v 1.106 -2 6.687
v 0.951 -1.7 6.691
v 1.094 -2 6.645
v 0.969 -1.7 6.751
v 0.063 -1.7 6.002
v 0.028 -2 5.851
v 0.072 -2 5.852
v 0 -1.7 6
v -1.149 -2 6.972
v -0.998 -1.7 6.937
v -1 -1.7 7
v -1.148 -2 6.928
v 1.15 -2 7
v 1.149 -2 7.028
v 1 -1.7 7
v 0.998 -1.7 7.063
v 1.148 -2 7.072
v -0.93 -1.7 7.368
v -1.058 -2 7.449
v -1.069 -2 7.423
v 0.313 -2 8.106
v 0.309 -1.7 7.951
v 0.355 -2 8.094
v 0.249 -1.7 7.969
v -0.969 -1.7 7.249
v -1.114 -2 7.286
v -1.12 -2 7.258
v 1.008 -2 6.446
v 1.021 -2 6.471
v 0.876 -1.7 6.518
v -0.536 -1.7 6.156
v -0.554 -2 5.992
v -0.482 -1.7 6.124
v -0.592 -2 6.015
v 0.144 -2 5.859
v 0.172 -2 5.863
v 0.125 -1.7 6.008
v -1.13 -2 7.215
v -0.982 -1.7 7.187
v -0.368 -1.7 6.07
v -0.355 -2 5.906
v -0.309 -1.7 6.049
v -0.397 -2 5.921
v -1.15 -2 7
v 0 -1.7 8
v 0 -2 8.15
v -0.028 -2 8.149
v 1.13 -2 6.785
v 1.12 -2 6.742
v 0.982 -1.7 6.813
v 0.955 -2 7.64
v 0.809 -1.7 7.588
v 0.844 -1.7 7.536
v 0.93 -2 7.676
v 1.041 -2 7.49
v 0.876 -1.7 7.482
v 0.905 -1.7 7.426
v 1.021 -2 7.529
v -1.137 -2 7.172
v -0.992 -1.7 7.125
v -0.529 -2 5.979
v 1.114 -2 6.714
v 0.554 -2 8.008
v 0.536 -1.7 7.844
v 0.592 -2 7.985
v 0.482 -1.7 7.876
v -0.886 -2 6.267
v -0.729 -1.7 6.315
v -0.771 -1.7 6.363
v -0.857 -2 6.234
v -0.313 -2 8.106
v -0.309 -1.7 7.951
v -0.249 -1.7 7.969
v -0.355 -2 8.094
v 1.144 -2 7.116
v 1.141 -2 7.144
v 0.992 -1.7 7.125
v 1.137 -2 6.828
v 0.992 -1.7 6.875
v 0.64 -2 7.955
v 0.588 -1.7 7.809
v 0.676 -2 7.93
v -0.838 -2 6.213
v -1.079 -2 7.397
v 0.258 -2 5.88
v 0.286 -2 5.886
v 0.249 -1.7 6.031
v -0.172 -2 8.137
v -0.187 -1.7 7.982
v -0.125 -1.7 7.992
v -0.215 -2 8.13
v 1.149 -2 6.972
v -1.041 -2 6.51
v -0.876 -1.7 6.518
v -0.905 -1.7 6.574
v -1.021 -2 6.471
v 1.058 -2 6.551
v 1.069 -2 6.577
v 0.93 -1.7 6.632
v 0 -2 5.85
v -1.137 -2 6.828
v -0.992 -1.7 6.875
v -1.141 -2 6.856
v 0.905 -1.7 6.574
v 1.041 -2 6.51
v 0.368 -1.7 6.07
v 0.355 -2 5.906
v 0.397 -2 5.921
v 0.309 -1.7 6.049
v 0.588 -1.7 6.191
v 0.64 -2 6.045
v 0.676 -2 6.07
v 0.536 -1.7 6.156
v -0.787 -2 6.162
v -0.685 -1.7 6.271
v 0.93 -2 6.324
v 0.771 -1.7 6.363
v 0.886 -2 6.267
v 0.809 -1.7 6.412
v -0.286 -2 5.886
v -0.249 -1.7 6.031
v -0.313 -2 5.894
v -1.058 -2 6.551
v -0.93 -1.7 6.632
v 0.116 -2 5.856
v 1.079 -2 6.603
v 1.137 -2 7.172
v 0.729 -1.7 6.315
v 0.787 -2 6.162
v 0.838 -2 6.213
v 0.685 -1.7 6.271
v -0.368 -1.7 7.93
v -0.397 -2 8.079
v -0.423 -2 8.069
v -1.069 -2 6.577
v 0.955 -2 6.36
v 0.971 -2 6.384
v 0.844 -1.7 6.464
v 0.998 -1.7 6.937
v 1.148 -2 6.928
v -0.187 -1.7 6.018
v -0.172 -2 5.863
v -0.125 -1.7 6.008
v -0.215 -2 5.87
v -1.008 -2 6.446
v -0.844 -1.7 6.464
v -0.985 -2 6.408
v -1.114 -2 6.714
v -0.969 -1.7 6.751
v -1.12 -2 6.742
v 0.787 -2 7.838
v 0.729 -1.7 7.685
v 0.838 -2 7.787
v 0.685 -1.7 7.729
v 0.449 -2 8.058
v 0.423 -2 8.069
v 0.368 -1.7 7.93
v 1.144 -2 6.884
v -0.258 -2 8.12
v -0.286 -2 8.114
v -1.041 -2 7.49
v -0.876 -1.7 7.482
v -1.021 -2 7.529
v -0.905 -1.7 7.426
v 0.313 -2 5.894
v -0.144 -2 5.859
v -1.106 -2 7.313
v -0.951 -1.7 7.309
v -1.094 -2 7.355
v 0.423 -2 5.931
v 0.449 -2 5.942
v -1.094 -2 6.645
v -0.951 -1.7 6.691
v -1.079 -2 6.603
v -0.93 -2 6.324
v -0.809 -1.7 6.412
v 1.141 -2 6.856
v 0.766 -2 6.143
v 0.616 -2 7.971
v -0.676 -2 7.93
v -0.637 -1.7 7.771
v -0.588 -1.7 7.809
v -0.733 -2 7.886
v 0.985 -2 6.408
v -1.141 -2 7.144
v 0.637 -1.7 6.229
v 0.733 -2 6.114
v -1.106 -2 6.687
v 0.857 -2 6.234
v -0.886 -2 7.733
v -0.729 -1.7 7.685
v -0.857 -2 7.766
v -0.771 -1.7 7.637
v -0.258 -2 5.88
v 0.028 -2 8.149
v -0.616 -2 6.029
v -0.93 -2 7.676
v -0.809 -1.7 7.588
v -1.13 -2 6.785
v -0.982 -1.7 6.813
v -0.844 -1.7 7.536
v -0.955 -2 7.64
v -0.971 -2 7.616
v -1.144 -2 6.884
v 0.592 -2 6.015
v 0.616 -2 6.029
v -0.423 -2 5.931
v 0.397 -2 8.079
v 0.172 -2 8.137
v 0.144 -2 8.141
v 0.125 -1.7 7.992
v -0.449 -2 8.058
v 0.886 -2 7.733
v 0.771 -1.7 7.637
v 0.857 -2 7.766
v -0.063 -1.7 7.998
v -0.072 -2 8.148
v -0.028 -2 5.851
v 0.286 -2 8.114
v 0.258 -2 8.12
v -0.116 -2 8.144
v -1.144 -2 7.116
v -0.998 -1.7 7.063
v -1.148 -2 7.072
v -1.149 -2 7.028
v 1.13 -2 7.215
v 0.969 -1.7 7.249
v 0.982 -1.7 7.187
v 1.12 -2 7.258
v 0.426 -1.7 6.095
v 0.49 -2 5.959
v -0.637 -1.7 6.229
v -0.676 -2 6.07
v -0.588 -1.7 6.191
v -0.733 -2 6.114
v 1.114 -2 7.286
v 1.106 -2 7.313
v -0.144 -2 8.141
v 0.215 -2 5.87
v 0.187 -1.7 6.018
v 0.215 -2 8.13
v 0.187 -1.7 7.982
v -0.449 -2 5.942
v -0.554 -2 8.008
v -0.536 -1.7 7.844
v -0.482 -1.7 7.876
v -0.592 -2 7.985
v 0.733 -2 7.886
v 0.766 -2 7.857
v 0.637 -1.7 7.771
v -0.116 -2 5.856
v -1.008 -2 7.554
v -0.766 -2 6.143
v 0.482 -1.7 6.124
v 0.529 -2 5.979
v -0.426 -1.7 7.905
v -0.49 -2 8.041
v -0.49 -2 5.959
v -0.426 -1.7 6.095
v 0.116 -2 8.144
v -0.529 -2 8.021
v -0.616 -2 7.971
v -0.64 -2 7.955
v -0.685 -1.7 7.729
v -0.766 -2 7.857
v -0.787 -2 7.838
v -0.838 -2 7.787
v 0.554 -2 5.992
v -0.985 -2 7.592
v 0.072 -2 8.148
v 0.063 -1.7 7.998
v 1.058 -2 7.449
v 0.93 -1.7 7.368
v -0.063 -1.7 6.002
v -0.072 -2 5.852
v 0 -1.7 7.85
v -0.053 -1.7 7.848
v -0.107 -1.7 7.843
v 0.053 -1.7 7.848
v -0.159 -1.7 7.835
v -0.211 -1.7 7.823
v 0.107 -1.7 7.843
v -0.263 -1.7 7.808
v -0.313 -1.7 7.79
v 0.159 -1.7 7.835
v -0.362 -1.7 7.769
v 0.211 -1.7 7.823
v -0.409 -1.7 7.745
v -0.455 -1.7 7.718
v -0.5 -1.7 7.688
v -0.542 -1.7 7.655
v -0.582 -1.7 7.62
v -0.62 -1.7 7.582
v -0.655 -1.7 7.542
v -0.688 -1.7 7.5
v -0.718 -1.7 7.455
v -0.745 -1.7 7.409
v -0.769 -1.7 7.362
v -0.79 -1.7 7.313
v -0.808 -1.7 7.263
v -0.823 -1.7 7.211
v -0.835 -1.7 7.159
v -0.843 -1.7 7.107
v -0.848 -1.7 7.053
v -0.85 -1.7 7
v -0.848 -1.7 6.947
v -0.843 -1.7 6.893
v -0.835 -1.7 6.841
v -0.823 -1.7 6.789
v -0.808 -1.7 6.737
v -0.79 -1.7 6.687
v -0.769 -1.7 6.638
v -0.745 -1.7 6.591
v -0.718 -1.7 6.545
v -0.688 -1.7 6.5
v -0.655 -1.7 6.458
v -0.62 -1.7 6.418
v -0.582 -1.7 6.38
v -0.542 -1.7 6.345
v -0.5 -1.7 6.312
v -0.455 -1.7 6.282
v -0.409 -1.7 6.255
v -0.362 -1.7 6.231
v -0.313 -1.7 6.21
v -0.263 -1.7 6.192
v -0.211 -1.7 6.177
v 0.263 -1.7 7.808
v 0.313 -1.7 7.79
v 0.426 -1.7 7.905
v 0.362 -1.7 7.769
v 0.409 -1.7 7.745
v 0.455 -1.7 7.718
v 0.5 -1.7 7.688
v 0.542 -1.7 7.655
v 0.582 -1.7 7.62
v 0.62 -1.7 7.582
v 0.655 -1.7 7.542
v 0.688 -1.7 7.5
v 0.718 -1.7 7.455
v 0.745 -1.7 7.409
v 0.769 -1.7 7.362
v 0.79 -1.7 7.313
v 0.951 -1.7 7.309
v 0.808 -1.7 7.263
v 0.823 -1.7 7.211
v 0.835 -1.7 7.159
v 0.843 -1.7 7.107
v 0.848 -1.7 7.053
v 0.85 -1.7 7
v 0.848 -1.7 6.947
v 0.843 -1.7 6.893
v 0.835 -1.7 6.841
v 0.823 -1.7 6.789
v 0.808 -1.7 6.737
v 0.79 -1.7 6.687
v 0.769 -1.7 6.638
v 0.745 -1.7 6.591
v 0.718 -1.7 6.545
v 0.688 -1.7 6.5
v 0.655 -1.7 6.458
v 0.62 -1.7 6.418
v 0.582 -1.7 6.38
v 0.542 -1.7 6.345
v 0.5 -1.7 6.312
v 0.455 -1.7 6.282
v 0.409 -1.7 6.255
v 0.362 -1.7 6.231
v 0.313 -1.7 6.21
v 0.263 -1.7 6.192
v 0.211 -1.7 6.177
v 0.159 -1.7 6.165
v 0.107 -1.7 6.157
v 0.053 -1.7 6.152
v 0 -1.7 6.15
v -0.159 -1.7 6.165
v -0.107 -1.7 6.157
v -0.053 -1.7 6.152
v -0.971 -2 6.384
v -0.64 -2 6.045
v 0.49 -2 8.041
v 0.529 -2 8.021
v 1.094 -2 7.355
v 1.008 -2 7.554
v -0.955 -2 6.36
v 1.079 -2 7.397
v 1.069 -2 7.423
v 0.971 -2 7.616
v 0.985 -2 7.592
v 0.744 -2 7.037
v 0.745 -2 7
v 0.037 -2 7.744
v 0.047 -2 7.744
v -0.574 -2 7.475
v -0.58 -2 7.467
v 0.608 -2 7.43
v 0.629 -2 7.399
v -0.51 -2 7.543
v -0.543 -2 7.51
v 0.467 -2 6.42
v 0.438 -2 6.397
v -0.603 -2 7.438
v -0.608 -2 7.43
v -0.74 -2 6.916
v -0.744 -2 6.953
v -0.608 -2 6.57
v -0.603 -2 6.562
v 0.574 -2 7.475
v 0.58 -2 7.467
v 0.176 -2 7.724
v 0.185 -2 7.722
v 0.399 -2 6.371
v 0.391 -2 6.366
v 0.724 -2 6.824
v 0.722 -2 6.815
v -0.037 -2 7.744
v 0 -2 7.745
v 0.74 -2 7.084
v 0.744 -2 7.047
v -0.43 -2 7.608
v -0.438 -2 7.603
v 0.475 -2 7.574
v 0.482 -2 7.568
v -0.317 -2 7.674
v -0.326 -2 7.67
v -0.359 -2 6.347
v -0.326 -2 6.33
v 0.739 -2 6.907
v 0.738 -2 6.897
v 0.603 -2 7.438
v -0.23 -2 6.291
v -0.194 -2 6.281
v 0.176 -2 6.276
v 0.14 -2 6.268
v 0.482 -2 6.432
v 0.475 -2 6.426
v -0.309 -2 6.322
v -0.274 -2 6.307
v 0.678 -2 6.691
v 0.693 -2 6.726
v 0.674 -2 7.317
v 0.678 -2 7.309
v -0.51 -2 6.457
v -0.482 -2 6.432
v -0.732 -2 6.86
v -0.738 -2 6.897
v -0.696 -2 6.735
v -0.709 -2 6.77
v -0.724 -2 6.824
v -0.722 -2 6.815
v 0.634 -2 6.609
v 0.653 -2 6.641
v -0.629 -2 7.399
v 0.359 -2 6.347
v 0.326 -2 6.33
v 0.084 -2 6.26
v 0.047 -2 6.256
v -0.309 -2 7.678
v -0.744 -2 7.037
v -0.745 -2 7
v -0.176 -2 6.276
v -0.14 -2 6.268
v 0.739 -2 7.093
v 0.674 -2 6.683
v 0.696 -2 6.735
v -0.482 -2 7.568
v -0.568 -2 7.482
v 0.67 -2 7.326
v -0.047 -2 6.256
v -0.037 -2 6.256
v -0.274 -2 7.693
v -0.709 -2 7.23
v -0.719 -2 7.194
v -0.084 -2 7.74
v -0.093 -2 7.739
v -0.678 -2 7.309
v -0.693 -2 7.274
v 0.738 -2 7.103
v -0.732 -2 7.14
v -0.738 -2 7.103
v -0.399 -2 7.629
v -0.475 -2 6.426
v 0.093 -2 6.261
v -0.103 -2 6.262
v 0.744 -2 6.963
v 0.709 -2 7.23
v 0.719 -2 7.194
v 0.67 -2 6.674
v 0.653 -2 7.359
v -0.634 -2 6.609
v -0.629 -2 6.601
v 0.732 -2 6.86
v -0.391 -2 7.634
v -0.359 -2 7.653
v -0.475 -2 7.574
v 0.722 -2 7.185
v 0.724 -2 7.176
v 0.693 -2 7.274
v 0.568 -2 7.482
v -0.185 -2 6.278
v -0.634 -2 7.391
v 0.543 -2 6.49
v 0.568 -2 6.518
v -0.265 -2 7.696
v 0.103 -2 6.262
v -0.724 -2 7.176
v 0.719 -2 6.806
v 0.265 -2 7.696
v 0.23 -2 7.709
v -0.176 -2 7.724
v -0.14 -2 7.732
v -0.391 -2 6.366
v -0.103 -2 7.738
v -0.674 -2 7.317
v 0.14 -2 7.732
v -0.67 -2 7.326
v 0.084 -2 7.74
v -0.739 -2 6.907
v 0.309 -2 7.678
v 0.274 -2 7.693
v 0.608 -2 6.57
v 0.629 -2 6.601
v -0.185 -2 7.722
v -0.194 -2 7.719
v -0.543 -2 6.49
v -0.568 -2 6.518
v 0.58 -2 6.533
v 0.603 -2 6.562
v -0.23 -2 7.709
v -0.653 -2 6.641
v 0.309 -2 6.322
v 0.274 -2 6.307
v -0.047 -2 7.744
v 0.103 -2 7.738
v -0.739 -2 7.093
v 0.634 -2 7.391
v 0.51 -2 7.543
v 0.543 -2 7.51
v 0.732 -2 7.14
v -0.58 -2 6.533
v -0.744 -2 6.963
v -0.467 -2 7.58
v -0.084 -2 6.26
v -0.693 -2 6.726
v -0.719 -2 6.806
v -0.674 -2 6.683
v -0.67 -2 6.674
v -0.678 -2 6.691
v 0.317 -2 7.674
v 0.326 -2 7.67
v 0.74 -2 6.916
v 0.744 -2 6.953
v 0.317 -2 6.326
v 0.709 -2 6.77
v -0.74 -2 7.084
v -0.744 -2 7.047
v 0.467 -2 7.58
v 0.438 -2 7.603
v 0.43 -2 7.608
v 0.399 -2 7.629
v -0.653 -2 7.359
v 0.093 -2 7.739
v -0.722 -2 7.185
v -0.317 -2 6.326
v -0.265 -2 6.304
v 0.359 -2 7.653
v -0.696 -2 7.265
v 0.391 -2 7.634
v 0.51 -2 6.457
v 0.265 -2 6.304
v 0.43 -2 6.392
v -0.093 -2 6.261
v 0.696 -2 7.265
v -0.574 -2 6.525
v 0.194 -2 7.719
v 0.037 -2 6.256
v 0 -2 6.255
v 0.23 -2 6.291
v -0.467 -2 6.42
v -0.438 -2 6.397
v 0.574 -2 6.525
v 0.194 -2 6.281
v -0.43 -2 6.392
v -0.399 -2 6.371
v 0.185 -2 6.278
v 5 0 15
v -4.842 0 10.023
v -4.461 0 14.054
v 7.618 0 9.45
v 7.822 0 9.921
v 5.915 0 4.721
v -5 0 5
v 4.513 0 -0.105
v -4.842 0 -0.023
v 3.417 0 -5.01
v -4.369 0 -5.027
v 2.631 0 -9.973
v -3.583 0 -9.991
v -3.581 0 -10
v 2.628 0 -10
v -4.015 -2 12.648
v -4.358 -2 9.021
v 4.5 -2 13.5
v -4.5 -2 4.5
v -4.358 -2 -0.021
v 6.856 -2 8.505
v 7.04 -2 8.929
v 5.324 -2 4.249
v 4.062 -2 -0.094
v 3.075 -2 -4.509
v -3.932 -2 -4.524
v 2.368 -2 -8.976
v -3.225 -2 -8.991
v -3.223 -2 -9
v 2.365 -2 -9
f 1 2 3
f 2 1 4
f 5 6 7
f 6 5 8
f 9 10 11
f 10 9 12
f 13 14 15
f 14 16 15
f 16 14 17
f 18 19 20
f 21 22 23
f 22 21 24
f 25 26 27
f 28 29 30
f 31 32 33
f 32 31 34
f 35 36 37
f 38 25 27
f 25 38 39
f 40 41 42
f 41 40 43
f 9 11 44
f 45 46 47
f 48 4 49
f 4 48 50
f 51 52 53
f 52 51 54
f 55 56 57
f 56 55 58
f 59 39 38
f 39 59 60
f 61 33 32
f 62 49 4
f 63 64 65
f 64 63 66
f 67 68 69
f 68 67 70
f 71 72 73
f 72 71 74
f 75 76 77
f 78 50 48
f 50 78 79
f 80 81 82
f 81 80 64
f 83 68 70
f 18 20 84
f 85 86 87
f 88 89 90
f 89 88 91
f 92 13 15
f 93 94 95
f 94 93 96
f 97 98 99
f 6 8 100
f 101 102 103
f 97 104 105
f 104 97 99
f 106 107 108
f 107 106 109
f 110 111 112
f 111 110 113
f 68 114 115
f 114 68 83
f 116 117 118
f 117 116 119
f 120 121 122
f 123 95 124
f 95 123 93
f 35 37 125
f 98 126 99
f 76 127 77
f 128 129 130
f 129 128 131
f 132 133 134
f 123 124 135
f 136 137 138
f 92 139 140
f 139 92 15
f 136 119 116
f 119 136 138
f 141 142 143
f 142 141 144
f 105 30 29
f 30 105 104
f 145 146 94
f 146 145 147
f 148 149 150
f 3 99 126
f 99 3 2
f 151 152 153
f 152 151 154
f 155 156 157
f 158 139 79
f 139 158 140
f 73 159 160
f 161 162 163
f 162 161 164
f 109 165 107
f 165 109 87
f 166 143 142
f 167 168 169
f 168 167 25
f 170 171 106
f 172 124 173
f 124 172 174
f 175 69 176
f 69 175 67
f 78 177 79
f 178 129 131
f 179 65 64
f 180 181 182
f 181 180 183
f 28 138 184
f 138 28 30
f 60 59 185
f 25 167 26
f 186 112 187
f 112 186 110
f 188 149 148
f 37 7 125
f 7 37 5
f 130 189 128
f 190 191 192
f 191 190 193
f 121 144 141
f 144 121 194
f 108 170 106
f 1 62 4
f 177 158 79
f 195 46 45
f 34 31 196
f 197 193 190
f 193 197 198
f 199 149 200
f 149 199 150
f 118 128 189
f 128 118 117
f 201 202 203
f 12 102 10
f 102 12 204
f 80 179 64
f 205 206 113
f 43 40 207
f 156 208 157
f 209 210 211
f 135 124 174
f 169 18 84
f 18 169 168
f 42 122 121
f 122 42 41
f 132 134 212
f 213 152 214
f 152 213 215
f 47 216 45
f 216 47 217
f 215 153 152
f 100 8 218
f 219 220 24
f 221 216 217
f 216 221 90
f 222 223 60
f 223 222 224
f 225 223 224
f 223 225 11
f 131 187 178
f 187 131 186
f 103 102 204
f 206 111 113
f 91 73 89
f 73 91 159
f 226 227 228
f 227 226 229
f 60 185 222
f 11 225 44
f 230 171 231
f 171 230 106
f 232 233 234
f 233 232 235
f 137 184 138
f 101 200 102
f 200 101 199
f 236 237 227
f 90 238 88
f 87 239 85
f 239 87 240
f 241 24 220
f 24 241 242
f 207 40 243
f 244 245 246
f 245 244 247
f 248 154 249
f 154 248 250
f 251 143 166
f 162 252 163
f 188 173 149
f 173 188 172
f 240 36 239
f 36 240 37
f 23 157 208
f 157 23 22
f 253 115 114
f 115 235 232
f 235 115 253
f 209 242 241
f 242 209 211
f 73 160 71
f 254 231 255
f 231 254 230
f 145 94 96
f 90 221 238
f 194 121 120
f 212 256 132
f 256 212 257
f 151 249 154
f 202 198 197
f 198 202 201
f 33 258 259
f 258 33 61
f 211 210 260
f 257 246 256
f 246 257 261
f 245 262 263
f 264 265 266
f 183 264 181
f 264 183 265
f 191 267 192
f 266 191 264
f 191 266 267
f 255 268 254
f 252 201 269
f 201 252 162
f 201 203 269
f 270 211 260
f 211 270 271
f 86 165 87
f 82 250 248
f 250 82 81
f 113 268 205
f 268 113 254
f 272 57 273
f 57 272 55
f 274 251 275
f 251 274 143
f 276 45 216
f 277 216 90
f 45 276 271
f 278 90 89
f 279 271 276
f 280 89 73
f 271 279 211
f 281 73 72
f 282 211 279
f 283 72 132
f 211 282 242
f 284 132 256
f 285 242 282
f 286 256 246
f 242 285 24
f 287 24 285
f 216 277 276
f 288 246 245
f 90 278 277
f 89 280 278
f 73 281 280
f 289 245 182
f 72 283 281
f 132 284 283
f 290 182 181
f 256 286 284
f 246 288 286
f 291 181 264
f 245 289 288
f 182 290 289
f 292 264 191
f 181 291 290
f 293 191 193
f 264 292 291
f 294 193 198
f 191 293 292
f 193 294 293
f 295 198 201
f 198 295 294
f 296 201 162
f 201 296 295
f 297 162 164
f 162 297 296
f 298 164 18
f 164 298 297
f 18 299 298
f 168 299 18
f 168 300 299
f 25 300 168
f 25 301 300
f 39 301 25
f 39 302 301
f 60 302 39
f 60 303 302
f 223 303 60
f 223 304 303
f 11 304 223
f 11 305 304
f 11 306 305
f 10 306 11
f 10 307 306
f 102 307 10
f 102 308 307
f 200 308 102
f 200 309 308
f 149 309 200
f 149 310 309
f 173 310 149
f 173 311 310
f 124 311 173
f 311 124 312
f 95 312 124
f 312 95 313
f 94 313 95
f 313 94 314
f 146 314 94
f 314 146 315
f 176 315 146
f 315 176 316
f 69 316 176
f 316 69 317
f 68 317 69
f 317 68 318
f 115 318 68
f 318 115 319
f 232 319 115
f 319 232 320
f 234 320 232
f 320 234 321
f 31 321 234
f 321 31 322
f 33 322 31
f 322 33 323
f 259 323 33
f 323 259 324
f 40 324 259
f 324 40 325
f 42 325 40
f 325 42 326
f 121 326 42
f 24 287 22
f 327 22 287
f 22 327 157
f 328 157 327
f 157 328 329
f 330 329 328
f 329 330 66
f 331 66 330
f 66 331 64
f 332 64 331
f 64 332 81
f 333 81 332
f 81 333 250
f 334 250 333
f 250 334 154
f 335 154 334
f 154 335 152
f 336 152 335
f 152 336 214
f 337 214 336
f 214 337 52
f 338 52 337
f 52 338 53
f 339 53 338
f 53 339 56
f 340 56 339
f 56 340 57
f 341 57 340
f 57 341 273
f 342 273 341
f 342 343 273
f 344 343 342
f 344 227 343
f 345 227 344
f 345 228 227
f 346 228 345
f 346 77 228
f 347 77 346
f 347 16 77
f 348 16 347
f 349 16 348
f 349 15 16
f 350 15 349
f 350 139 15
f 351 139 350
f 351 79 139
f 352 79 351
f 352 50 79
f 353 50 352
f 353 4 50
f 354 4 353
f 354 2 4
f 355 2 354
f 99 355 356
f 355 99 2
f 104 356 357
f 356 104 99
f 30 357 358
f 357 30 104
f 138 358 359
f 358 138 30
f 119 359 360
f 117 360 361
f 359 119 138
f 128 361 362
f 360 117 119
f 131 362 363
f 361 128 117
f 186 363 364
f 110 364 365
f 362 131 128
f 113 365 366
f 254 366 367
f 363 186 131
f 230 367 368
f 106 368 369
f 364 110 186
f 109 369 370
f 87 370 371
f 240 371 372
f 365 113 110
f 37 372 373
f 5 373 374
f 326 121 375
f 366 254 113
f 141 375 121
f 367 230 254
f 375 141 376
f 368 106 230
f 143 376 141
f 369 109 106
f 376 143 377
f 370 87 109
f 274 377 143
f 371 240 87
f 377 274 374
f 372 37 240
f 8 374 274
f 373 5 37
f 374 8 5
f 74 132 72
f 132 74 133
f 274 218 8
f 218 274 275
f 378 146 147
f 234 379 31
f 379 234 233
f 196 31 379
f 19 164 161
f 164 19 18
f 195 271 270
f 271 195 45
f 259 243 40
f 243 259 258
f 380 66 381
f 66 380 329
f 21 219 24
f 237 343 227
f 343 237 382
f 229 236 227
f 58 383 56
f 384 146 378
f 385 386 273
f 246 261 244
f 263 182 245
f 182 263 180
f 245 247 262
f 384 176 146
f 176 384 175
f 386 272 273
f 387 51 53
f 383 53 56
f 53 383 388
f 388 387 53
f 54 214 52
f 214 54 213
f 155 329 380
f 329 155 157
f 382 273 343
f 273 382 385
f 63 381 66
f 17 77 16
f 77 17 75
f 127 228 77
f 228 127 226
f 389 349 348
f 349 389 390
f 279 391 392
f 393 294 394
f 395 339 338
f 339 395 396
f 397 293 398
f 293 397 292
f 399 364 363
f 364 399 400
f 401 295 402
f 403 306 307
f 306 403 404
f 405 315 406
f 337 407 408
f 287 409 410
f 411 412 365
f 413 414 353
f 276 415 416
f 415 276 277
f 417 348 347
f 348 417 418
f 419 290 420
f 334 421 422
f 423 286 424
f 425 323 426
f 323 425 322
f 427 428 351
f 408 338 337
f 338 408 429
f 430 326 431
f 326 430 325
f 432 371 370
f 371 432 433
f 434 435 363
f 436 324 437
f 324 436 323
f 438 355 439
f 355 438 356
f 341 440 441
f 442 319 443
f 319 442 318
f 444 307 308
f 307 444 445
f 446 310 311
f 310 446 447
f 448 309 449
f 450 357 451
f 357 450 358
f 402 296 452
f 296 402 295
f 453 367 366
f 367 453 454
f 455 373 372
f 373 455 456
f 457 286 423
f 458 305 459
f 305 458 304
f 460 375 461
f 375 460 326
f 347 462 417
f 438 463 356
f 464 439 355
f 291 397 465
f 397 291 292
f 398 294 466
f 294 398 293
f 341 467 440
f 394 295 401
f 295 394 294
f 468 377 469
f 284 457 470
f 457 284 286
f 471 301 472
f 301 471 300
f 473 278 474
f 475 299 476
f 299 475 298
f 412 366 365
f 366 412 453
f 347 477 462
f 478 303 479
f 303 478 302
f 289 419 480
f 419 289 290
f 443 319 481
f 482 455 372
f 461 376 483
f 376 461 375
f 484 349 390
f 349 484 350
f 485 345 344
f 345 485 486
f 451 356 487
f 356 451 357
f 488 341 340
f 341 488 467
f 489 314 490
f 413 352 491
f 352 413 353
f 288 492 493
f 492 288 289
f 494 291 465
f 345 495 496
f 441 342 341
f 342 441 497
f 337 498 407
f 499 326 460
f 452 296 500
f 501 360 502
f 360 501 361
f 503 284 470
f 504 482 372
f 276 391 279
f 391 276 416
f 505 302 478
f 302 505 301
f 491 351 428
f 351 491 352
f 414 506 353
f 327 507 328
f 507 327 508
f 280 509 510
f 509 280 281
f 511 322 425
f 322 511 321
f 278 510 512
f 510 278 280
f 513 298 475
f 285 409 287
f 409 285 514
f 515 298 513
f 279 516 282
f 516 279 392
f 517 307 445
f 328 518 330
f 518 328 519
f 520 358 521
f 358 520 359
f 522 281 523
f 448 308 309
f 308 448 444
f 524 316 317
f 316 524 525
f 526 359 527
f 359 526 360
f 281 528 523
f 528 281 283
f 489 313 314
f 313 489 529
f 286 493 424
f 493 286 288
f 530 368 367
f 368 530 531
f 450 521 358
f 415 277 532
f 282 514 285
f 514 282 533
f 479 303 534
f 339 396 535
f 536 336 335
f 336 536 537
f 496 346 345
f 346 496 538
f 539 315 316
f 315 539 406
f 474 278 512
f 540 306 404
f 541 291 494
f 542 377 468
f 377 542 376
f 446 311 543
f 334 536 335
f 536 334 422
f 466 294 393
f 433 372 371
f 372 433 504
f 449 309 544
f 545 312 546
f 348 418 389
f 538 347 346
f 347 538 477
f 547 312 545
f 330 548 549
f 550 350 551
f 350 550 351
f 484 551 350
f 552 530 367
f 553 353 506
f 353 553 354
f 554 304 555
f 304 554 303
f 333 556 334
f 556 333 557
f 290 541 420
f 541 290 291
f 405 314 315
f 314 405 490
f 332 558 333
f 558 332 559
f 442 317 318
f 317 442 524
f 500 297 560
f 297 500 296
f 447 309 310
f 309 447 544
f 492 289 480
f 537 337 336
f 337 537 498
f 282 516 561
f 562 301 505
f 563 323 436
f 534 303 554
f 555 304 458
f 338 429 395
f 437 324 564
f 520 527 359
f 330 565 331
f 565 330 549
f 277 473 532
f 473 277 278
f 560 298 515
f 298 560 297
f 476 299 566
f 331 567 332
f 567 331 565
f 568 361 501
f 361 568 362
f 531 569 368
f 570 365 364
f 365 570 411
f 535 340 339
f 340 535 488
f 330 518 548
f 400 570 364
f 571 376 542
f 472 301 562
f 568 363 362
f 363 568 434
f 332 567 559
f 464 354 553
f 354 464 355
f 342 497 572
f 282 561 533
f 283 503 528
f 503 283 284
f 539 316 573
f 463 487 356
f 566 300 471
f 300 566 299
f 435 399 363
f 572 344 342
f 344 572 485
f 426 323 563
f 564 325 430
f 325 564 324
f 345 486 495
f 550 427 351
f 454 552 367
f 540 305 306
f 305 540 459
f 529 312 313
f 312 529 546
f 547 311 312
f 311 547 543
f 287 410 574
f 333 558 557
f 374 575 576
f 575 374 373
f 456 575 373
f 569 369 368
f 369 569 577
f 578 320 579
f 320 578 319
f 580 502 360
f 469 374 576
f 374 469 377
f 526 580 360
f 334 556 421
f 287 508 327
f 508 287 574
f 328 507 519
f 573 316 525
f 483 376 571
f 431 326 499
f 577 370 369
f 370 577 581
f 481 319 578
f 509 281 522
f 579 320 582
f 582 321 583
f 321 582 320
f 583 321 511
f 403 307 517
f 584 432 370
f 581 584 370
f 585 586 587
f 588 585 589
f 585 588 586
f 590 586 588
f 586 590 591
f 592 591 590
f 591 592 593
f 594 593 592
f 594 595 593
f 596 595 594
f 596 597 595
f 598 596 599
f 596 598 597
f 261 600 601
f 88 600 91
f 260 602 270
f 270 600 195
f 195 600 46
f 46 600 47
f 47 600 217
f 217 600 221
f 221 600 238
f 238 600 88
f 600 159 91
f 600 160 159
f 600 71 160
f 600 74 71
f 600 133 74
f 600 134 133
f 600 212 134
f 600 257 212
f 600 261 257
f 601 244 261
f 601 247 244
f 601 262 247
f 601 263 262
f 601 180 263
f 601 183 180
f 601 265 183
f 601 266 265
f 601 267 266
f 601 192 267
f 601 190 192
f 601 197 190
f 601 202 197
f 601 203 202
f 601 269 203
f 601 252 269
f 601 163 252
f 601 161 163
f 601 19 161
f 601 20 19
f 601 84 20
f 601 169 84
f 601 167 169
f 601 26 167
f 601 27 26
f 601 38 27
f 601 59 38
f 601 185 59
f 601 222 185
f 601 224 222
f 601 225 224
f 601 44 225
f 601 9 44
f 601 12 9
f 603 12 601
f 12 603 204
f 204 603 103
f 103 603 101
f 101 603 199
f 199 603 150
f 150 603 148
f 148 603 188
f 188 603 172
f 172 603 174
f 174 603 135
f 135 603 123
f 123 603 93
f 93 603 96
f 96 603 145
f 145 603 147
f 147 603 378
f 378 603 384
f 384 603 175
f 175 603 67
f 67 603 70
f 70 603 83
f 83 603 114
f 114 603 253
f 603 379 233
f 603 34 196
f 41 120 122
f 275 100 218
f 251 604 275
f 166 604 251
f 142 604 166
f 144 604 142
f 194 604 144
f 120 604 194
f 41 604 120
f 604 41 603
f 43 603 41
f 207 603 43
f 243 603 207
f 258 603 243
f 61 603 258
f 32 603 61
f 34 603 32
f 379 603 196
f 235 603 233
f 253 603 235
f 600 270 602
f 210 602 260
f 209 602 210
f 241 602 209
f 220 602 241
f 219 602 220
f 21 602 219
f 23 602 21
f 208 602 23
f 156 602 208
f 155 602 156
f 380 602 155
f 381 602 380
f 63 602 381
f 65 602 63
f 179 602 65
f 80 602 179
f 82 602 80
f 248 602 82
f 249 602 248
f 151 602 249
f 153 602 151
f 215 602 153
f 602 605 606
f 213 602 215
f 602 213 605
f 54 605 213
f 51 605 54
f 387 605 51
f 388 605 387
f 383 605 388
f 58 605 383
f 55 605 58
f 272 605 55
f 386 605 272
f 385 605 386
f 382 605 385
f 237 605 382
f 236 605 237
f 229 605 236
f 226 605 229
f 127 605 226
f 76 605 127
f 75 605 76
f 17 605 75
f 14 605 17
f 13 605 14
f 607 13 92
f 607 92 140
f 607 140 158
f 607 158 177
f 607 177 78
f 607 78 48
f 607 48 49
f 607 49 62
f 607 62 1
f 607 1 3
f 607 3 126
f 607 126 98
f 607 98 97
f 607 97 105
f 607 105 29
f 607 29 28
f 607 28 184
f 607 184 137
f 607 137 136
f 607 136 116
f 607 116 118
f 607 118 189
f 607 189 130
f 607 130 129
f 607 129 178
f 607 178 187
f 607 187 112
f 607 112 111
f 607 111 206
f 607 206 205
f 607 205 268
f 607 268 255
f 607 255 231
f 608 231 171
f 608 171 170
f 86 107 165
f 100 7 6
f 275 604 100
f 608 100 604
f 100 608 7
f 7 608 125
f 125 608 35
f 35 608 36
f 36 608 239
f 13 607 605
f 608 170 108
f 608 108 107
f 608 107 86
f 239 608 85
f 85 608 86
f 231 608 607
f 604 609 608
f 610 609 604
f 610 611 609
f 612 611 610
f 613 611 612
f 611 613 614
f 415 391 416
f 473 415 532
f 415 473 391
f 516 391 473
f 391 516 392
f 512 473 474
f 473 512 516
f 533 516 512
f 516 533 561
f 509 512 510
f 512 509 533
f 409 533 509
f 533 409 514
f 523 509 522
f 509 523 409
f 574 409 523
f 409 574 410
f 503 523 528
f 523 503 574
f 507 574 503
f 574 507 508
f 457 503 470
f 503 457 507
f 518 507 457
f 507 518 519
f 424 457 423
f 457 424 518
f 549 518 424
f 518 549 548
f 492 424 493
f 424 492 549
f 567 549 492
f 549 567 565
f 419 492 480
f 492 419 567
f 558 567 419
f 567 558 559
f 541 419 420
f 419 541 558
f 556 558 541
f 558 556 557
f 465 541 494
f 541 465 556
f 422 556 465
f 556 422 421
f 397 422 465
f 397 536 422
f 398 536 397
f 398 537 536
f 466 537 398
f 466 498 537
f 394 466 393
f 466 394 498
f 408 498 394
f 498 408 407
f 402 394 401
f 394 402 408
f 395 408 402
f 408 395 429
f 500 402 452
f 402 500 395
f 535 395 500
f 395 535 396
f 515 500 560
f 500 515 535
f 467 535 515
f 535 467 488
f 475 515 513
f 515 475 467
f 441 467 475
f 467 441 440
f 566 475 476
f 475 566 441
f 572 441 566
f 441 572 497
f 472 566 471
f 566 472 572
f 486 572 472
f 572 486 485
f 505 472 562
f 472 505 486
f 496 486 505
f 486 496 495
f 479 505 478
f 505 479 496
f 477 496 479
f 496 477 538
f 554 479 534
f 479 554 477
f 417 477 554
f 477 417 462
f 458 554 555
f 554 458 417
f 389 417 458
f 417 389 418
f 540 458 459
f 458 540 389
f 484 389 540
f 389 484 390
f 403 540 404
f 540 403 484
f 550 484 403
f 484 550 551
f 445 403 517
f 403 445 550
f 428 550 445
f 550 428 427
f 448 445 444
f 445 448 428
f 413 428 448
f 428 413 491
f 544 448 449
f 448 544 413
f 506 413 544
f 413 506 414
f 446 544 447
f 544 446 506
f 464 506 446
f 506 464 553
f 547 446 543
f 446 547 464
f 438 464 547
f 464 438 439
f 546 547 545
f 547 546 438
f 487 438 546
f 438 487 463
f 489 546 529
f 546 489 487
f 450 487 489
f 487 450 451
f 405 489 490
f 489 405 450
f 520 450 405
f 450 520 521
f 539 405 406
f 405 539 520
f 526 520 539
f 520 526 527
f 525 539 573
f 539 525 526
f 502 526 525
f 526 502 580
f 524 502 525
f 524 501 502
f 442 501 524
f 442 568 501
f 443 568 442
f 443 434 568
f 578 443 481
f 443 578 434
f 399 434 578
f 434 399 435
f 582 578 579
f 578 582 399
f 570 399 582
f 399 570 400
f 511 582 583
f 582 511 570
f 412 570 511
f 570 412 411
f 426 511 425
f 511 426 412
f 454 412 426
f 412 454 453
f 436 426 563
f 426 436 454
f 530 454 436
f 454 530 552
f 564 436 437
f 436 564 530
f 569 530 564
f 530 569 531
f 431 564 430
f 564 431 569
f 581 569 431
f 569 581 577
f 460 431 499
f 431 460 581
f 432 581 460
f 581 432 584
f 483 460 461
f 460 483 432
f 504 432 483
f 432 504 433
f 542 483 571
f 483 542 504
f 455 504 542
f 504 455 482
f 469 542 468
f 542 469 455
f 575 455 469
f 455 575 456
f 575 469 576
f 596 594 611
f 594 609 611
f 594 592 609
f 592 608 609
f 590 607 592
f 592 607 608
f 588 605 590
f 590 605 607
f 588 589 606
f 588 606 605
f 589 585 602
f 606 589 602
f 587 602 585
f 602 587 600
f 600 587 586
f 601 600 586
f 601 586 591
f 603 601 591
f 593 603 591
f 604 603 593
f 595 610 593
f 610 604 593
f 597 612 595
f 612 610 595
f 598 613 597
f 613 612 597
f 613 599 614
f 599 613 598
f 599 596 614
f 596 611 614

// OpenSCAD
$fn = 100;

module shape() {
    translate([-5, -10])
    difference() {
        intersection() {
            polygon([
                [0, 0],
                [0, 24],
                [10, 25], // 5, 25 for front
                [15, 16],
                [8, 0]
            ]);
            translate([80, 15]) circle(80);
        }
        translate([87, -10]) circle(80);
    }
}

module joint() {
    difference() {
        cylinder(d1=2, d2=3, h=1);
        cylinder(d1=1.7, d2=1, h=1);
    }
}

rotate([90, 0, 0])
difference() {
    linear_extrude(height=2, scale=0.9) shape();
    translate([0, 7, 1.7]) joint();
}
